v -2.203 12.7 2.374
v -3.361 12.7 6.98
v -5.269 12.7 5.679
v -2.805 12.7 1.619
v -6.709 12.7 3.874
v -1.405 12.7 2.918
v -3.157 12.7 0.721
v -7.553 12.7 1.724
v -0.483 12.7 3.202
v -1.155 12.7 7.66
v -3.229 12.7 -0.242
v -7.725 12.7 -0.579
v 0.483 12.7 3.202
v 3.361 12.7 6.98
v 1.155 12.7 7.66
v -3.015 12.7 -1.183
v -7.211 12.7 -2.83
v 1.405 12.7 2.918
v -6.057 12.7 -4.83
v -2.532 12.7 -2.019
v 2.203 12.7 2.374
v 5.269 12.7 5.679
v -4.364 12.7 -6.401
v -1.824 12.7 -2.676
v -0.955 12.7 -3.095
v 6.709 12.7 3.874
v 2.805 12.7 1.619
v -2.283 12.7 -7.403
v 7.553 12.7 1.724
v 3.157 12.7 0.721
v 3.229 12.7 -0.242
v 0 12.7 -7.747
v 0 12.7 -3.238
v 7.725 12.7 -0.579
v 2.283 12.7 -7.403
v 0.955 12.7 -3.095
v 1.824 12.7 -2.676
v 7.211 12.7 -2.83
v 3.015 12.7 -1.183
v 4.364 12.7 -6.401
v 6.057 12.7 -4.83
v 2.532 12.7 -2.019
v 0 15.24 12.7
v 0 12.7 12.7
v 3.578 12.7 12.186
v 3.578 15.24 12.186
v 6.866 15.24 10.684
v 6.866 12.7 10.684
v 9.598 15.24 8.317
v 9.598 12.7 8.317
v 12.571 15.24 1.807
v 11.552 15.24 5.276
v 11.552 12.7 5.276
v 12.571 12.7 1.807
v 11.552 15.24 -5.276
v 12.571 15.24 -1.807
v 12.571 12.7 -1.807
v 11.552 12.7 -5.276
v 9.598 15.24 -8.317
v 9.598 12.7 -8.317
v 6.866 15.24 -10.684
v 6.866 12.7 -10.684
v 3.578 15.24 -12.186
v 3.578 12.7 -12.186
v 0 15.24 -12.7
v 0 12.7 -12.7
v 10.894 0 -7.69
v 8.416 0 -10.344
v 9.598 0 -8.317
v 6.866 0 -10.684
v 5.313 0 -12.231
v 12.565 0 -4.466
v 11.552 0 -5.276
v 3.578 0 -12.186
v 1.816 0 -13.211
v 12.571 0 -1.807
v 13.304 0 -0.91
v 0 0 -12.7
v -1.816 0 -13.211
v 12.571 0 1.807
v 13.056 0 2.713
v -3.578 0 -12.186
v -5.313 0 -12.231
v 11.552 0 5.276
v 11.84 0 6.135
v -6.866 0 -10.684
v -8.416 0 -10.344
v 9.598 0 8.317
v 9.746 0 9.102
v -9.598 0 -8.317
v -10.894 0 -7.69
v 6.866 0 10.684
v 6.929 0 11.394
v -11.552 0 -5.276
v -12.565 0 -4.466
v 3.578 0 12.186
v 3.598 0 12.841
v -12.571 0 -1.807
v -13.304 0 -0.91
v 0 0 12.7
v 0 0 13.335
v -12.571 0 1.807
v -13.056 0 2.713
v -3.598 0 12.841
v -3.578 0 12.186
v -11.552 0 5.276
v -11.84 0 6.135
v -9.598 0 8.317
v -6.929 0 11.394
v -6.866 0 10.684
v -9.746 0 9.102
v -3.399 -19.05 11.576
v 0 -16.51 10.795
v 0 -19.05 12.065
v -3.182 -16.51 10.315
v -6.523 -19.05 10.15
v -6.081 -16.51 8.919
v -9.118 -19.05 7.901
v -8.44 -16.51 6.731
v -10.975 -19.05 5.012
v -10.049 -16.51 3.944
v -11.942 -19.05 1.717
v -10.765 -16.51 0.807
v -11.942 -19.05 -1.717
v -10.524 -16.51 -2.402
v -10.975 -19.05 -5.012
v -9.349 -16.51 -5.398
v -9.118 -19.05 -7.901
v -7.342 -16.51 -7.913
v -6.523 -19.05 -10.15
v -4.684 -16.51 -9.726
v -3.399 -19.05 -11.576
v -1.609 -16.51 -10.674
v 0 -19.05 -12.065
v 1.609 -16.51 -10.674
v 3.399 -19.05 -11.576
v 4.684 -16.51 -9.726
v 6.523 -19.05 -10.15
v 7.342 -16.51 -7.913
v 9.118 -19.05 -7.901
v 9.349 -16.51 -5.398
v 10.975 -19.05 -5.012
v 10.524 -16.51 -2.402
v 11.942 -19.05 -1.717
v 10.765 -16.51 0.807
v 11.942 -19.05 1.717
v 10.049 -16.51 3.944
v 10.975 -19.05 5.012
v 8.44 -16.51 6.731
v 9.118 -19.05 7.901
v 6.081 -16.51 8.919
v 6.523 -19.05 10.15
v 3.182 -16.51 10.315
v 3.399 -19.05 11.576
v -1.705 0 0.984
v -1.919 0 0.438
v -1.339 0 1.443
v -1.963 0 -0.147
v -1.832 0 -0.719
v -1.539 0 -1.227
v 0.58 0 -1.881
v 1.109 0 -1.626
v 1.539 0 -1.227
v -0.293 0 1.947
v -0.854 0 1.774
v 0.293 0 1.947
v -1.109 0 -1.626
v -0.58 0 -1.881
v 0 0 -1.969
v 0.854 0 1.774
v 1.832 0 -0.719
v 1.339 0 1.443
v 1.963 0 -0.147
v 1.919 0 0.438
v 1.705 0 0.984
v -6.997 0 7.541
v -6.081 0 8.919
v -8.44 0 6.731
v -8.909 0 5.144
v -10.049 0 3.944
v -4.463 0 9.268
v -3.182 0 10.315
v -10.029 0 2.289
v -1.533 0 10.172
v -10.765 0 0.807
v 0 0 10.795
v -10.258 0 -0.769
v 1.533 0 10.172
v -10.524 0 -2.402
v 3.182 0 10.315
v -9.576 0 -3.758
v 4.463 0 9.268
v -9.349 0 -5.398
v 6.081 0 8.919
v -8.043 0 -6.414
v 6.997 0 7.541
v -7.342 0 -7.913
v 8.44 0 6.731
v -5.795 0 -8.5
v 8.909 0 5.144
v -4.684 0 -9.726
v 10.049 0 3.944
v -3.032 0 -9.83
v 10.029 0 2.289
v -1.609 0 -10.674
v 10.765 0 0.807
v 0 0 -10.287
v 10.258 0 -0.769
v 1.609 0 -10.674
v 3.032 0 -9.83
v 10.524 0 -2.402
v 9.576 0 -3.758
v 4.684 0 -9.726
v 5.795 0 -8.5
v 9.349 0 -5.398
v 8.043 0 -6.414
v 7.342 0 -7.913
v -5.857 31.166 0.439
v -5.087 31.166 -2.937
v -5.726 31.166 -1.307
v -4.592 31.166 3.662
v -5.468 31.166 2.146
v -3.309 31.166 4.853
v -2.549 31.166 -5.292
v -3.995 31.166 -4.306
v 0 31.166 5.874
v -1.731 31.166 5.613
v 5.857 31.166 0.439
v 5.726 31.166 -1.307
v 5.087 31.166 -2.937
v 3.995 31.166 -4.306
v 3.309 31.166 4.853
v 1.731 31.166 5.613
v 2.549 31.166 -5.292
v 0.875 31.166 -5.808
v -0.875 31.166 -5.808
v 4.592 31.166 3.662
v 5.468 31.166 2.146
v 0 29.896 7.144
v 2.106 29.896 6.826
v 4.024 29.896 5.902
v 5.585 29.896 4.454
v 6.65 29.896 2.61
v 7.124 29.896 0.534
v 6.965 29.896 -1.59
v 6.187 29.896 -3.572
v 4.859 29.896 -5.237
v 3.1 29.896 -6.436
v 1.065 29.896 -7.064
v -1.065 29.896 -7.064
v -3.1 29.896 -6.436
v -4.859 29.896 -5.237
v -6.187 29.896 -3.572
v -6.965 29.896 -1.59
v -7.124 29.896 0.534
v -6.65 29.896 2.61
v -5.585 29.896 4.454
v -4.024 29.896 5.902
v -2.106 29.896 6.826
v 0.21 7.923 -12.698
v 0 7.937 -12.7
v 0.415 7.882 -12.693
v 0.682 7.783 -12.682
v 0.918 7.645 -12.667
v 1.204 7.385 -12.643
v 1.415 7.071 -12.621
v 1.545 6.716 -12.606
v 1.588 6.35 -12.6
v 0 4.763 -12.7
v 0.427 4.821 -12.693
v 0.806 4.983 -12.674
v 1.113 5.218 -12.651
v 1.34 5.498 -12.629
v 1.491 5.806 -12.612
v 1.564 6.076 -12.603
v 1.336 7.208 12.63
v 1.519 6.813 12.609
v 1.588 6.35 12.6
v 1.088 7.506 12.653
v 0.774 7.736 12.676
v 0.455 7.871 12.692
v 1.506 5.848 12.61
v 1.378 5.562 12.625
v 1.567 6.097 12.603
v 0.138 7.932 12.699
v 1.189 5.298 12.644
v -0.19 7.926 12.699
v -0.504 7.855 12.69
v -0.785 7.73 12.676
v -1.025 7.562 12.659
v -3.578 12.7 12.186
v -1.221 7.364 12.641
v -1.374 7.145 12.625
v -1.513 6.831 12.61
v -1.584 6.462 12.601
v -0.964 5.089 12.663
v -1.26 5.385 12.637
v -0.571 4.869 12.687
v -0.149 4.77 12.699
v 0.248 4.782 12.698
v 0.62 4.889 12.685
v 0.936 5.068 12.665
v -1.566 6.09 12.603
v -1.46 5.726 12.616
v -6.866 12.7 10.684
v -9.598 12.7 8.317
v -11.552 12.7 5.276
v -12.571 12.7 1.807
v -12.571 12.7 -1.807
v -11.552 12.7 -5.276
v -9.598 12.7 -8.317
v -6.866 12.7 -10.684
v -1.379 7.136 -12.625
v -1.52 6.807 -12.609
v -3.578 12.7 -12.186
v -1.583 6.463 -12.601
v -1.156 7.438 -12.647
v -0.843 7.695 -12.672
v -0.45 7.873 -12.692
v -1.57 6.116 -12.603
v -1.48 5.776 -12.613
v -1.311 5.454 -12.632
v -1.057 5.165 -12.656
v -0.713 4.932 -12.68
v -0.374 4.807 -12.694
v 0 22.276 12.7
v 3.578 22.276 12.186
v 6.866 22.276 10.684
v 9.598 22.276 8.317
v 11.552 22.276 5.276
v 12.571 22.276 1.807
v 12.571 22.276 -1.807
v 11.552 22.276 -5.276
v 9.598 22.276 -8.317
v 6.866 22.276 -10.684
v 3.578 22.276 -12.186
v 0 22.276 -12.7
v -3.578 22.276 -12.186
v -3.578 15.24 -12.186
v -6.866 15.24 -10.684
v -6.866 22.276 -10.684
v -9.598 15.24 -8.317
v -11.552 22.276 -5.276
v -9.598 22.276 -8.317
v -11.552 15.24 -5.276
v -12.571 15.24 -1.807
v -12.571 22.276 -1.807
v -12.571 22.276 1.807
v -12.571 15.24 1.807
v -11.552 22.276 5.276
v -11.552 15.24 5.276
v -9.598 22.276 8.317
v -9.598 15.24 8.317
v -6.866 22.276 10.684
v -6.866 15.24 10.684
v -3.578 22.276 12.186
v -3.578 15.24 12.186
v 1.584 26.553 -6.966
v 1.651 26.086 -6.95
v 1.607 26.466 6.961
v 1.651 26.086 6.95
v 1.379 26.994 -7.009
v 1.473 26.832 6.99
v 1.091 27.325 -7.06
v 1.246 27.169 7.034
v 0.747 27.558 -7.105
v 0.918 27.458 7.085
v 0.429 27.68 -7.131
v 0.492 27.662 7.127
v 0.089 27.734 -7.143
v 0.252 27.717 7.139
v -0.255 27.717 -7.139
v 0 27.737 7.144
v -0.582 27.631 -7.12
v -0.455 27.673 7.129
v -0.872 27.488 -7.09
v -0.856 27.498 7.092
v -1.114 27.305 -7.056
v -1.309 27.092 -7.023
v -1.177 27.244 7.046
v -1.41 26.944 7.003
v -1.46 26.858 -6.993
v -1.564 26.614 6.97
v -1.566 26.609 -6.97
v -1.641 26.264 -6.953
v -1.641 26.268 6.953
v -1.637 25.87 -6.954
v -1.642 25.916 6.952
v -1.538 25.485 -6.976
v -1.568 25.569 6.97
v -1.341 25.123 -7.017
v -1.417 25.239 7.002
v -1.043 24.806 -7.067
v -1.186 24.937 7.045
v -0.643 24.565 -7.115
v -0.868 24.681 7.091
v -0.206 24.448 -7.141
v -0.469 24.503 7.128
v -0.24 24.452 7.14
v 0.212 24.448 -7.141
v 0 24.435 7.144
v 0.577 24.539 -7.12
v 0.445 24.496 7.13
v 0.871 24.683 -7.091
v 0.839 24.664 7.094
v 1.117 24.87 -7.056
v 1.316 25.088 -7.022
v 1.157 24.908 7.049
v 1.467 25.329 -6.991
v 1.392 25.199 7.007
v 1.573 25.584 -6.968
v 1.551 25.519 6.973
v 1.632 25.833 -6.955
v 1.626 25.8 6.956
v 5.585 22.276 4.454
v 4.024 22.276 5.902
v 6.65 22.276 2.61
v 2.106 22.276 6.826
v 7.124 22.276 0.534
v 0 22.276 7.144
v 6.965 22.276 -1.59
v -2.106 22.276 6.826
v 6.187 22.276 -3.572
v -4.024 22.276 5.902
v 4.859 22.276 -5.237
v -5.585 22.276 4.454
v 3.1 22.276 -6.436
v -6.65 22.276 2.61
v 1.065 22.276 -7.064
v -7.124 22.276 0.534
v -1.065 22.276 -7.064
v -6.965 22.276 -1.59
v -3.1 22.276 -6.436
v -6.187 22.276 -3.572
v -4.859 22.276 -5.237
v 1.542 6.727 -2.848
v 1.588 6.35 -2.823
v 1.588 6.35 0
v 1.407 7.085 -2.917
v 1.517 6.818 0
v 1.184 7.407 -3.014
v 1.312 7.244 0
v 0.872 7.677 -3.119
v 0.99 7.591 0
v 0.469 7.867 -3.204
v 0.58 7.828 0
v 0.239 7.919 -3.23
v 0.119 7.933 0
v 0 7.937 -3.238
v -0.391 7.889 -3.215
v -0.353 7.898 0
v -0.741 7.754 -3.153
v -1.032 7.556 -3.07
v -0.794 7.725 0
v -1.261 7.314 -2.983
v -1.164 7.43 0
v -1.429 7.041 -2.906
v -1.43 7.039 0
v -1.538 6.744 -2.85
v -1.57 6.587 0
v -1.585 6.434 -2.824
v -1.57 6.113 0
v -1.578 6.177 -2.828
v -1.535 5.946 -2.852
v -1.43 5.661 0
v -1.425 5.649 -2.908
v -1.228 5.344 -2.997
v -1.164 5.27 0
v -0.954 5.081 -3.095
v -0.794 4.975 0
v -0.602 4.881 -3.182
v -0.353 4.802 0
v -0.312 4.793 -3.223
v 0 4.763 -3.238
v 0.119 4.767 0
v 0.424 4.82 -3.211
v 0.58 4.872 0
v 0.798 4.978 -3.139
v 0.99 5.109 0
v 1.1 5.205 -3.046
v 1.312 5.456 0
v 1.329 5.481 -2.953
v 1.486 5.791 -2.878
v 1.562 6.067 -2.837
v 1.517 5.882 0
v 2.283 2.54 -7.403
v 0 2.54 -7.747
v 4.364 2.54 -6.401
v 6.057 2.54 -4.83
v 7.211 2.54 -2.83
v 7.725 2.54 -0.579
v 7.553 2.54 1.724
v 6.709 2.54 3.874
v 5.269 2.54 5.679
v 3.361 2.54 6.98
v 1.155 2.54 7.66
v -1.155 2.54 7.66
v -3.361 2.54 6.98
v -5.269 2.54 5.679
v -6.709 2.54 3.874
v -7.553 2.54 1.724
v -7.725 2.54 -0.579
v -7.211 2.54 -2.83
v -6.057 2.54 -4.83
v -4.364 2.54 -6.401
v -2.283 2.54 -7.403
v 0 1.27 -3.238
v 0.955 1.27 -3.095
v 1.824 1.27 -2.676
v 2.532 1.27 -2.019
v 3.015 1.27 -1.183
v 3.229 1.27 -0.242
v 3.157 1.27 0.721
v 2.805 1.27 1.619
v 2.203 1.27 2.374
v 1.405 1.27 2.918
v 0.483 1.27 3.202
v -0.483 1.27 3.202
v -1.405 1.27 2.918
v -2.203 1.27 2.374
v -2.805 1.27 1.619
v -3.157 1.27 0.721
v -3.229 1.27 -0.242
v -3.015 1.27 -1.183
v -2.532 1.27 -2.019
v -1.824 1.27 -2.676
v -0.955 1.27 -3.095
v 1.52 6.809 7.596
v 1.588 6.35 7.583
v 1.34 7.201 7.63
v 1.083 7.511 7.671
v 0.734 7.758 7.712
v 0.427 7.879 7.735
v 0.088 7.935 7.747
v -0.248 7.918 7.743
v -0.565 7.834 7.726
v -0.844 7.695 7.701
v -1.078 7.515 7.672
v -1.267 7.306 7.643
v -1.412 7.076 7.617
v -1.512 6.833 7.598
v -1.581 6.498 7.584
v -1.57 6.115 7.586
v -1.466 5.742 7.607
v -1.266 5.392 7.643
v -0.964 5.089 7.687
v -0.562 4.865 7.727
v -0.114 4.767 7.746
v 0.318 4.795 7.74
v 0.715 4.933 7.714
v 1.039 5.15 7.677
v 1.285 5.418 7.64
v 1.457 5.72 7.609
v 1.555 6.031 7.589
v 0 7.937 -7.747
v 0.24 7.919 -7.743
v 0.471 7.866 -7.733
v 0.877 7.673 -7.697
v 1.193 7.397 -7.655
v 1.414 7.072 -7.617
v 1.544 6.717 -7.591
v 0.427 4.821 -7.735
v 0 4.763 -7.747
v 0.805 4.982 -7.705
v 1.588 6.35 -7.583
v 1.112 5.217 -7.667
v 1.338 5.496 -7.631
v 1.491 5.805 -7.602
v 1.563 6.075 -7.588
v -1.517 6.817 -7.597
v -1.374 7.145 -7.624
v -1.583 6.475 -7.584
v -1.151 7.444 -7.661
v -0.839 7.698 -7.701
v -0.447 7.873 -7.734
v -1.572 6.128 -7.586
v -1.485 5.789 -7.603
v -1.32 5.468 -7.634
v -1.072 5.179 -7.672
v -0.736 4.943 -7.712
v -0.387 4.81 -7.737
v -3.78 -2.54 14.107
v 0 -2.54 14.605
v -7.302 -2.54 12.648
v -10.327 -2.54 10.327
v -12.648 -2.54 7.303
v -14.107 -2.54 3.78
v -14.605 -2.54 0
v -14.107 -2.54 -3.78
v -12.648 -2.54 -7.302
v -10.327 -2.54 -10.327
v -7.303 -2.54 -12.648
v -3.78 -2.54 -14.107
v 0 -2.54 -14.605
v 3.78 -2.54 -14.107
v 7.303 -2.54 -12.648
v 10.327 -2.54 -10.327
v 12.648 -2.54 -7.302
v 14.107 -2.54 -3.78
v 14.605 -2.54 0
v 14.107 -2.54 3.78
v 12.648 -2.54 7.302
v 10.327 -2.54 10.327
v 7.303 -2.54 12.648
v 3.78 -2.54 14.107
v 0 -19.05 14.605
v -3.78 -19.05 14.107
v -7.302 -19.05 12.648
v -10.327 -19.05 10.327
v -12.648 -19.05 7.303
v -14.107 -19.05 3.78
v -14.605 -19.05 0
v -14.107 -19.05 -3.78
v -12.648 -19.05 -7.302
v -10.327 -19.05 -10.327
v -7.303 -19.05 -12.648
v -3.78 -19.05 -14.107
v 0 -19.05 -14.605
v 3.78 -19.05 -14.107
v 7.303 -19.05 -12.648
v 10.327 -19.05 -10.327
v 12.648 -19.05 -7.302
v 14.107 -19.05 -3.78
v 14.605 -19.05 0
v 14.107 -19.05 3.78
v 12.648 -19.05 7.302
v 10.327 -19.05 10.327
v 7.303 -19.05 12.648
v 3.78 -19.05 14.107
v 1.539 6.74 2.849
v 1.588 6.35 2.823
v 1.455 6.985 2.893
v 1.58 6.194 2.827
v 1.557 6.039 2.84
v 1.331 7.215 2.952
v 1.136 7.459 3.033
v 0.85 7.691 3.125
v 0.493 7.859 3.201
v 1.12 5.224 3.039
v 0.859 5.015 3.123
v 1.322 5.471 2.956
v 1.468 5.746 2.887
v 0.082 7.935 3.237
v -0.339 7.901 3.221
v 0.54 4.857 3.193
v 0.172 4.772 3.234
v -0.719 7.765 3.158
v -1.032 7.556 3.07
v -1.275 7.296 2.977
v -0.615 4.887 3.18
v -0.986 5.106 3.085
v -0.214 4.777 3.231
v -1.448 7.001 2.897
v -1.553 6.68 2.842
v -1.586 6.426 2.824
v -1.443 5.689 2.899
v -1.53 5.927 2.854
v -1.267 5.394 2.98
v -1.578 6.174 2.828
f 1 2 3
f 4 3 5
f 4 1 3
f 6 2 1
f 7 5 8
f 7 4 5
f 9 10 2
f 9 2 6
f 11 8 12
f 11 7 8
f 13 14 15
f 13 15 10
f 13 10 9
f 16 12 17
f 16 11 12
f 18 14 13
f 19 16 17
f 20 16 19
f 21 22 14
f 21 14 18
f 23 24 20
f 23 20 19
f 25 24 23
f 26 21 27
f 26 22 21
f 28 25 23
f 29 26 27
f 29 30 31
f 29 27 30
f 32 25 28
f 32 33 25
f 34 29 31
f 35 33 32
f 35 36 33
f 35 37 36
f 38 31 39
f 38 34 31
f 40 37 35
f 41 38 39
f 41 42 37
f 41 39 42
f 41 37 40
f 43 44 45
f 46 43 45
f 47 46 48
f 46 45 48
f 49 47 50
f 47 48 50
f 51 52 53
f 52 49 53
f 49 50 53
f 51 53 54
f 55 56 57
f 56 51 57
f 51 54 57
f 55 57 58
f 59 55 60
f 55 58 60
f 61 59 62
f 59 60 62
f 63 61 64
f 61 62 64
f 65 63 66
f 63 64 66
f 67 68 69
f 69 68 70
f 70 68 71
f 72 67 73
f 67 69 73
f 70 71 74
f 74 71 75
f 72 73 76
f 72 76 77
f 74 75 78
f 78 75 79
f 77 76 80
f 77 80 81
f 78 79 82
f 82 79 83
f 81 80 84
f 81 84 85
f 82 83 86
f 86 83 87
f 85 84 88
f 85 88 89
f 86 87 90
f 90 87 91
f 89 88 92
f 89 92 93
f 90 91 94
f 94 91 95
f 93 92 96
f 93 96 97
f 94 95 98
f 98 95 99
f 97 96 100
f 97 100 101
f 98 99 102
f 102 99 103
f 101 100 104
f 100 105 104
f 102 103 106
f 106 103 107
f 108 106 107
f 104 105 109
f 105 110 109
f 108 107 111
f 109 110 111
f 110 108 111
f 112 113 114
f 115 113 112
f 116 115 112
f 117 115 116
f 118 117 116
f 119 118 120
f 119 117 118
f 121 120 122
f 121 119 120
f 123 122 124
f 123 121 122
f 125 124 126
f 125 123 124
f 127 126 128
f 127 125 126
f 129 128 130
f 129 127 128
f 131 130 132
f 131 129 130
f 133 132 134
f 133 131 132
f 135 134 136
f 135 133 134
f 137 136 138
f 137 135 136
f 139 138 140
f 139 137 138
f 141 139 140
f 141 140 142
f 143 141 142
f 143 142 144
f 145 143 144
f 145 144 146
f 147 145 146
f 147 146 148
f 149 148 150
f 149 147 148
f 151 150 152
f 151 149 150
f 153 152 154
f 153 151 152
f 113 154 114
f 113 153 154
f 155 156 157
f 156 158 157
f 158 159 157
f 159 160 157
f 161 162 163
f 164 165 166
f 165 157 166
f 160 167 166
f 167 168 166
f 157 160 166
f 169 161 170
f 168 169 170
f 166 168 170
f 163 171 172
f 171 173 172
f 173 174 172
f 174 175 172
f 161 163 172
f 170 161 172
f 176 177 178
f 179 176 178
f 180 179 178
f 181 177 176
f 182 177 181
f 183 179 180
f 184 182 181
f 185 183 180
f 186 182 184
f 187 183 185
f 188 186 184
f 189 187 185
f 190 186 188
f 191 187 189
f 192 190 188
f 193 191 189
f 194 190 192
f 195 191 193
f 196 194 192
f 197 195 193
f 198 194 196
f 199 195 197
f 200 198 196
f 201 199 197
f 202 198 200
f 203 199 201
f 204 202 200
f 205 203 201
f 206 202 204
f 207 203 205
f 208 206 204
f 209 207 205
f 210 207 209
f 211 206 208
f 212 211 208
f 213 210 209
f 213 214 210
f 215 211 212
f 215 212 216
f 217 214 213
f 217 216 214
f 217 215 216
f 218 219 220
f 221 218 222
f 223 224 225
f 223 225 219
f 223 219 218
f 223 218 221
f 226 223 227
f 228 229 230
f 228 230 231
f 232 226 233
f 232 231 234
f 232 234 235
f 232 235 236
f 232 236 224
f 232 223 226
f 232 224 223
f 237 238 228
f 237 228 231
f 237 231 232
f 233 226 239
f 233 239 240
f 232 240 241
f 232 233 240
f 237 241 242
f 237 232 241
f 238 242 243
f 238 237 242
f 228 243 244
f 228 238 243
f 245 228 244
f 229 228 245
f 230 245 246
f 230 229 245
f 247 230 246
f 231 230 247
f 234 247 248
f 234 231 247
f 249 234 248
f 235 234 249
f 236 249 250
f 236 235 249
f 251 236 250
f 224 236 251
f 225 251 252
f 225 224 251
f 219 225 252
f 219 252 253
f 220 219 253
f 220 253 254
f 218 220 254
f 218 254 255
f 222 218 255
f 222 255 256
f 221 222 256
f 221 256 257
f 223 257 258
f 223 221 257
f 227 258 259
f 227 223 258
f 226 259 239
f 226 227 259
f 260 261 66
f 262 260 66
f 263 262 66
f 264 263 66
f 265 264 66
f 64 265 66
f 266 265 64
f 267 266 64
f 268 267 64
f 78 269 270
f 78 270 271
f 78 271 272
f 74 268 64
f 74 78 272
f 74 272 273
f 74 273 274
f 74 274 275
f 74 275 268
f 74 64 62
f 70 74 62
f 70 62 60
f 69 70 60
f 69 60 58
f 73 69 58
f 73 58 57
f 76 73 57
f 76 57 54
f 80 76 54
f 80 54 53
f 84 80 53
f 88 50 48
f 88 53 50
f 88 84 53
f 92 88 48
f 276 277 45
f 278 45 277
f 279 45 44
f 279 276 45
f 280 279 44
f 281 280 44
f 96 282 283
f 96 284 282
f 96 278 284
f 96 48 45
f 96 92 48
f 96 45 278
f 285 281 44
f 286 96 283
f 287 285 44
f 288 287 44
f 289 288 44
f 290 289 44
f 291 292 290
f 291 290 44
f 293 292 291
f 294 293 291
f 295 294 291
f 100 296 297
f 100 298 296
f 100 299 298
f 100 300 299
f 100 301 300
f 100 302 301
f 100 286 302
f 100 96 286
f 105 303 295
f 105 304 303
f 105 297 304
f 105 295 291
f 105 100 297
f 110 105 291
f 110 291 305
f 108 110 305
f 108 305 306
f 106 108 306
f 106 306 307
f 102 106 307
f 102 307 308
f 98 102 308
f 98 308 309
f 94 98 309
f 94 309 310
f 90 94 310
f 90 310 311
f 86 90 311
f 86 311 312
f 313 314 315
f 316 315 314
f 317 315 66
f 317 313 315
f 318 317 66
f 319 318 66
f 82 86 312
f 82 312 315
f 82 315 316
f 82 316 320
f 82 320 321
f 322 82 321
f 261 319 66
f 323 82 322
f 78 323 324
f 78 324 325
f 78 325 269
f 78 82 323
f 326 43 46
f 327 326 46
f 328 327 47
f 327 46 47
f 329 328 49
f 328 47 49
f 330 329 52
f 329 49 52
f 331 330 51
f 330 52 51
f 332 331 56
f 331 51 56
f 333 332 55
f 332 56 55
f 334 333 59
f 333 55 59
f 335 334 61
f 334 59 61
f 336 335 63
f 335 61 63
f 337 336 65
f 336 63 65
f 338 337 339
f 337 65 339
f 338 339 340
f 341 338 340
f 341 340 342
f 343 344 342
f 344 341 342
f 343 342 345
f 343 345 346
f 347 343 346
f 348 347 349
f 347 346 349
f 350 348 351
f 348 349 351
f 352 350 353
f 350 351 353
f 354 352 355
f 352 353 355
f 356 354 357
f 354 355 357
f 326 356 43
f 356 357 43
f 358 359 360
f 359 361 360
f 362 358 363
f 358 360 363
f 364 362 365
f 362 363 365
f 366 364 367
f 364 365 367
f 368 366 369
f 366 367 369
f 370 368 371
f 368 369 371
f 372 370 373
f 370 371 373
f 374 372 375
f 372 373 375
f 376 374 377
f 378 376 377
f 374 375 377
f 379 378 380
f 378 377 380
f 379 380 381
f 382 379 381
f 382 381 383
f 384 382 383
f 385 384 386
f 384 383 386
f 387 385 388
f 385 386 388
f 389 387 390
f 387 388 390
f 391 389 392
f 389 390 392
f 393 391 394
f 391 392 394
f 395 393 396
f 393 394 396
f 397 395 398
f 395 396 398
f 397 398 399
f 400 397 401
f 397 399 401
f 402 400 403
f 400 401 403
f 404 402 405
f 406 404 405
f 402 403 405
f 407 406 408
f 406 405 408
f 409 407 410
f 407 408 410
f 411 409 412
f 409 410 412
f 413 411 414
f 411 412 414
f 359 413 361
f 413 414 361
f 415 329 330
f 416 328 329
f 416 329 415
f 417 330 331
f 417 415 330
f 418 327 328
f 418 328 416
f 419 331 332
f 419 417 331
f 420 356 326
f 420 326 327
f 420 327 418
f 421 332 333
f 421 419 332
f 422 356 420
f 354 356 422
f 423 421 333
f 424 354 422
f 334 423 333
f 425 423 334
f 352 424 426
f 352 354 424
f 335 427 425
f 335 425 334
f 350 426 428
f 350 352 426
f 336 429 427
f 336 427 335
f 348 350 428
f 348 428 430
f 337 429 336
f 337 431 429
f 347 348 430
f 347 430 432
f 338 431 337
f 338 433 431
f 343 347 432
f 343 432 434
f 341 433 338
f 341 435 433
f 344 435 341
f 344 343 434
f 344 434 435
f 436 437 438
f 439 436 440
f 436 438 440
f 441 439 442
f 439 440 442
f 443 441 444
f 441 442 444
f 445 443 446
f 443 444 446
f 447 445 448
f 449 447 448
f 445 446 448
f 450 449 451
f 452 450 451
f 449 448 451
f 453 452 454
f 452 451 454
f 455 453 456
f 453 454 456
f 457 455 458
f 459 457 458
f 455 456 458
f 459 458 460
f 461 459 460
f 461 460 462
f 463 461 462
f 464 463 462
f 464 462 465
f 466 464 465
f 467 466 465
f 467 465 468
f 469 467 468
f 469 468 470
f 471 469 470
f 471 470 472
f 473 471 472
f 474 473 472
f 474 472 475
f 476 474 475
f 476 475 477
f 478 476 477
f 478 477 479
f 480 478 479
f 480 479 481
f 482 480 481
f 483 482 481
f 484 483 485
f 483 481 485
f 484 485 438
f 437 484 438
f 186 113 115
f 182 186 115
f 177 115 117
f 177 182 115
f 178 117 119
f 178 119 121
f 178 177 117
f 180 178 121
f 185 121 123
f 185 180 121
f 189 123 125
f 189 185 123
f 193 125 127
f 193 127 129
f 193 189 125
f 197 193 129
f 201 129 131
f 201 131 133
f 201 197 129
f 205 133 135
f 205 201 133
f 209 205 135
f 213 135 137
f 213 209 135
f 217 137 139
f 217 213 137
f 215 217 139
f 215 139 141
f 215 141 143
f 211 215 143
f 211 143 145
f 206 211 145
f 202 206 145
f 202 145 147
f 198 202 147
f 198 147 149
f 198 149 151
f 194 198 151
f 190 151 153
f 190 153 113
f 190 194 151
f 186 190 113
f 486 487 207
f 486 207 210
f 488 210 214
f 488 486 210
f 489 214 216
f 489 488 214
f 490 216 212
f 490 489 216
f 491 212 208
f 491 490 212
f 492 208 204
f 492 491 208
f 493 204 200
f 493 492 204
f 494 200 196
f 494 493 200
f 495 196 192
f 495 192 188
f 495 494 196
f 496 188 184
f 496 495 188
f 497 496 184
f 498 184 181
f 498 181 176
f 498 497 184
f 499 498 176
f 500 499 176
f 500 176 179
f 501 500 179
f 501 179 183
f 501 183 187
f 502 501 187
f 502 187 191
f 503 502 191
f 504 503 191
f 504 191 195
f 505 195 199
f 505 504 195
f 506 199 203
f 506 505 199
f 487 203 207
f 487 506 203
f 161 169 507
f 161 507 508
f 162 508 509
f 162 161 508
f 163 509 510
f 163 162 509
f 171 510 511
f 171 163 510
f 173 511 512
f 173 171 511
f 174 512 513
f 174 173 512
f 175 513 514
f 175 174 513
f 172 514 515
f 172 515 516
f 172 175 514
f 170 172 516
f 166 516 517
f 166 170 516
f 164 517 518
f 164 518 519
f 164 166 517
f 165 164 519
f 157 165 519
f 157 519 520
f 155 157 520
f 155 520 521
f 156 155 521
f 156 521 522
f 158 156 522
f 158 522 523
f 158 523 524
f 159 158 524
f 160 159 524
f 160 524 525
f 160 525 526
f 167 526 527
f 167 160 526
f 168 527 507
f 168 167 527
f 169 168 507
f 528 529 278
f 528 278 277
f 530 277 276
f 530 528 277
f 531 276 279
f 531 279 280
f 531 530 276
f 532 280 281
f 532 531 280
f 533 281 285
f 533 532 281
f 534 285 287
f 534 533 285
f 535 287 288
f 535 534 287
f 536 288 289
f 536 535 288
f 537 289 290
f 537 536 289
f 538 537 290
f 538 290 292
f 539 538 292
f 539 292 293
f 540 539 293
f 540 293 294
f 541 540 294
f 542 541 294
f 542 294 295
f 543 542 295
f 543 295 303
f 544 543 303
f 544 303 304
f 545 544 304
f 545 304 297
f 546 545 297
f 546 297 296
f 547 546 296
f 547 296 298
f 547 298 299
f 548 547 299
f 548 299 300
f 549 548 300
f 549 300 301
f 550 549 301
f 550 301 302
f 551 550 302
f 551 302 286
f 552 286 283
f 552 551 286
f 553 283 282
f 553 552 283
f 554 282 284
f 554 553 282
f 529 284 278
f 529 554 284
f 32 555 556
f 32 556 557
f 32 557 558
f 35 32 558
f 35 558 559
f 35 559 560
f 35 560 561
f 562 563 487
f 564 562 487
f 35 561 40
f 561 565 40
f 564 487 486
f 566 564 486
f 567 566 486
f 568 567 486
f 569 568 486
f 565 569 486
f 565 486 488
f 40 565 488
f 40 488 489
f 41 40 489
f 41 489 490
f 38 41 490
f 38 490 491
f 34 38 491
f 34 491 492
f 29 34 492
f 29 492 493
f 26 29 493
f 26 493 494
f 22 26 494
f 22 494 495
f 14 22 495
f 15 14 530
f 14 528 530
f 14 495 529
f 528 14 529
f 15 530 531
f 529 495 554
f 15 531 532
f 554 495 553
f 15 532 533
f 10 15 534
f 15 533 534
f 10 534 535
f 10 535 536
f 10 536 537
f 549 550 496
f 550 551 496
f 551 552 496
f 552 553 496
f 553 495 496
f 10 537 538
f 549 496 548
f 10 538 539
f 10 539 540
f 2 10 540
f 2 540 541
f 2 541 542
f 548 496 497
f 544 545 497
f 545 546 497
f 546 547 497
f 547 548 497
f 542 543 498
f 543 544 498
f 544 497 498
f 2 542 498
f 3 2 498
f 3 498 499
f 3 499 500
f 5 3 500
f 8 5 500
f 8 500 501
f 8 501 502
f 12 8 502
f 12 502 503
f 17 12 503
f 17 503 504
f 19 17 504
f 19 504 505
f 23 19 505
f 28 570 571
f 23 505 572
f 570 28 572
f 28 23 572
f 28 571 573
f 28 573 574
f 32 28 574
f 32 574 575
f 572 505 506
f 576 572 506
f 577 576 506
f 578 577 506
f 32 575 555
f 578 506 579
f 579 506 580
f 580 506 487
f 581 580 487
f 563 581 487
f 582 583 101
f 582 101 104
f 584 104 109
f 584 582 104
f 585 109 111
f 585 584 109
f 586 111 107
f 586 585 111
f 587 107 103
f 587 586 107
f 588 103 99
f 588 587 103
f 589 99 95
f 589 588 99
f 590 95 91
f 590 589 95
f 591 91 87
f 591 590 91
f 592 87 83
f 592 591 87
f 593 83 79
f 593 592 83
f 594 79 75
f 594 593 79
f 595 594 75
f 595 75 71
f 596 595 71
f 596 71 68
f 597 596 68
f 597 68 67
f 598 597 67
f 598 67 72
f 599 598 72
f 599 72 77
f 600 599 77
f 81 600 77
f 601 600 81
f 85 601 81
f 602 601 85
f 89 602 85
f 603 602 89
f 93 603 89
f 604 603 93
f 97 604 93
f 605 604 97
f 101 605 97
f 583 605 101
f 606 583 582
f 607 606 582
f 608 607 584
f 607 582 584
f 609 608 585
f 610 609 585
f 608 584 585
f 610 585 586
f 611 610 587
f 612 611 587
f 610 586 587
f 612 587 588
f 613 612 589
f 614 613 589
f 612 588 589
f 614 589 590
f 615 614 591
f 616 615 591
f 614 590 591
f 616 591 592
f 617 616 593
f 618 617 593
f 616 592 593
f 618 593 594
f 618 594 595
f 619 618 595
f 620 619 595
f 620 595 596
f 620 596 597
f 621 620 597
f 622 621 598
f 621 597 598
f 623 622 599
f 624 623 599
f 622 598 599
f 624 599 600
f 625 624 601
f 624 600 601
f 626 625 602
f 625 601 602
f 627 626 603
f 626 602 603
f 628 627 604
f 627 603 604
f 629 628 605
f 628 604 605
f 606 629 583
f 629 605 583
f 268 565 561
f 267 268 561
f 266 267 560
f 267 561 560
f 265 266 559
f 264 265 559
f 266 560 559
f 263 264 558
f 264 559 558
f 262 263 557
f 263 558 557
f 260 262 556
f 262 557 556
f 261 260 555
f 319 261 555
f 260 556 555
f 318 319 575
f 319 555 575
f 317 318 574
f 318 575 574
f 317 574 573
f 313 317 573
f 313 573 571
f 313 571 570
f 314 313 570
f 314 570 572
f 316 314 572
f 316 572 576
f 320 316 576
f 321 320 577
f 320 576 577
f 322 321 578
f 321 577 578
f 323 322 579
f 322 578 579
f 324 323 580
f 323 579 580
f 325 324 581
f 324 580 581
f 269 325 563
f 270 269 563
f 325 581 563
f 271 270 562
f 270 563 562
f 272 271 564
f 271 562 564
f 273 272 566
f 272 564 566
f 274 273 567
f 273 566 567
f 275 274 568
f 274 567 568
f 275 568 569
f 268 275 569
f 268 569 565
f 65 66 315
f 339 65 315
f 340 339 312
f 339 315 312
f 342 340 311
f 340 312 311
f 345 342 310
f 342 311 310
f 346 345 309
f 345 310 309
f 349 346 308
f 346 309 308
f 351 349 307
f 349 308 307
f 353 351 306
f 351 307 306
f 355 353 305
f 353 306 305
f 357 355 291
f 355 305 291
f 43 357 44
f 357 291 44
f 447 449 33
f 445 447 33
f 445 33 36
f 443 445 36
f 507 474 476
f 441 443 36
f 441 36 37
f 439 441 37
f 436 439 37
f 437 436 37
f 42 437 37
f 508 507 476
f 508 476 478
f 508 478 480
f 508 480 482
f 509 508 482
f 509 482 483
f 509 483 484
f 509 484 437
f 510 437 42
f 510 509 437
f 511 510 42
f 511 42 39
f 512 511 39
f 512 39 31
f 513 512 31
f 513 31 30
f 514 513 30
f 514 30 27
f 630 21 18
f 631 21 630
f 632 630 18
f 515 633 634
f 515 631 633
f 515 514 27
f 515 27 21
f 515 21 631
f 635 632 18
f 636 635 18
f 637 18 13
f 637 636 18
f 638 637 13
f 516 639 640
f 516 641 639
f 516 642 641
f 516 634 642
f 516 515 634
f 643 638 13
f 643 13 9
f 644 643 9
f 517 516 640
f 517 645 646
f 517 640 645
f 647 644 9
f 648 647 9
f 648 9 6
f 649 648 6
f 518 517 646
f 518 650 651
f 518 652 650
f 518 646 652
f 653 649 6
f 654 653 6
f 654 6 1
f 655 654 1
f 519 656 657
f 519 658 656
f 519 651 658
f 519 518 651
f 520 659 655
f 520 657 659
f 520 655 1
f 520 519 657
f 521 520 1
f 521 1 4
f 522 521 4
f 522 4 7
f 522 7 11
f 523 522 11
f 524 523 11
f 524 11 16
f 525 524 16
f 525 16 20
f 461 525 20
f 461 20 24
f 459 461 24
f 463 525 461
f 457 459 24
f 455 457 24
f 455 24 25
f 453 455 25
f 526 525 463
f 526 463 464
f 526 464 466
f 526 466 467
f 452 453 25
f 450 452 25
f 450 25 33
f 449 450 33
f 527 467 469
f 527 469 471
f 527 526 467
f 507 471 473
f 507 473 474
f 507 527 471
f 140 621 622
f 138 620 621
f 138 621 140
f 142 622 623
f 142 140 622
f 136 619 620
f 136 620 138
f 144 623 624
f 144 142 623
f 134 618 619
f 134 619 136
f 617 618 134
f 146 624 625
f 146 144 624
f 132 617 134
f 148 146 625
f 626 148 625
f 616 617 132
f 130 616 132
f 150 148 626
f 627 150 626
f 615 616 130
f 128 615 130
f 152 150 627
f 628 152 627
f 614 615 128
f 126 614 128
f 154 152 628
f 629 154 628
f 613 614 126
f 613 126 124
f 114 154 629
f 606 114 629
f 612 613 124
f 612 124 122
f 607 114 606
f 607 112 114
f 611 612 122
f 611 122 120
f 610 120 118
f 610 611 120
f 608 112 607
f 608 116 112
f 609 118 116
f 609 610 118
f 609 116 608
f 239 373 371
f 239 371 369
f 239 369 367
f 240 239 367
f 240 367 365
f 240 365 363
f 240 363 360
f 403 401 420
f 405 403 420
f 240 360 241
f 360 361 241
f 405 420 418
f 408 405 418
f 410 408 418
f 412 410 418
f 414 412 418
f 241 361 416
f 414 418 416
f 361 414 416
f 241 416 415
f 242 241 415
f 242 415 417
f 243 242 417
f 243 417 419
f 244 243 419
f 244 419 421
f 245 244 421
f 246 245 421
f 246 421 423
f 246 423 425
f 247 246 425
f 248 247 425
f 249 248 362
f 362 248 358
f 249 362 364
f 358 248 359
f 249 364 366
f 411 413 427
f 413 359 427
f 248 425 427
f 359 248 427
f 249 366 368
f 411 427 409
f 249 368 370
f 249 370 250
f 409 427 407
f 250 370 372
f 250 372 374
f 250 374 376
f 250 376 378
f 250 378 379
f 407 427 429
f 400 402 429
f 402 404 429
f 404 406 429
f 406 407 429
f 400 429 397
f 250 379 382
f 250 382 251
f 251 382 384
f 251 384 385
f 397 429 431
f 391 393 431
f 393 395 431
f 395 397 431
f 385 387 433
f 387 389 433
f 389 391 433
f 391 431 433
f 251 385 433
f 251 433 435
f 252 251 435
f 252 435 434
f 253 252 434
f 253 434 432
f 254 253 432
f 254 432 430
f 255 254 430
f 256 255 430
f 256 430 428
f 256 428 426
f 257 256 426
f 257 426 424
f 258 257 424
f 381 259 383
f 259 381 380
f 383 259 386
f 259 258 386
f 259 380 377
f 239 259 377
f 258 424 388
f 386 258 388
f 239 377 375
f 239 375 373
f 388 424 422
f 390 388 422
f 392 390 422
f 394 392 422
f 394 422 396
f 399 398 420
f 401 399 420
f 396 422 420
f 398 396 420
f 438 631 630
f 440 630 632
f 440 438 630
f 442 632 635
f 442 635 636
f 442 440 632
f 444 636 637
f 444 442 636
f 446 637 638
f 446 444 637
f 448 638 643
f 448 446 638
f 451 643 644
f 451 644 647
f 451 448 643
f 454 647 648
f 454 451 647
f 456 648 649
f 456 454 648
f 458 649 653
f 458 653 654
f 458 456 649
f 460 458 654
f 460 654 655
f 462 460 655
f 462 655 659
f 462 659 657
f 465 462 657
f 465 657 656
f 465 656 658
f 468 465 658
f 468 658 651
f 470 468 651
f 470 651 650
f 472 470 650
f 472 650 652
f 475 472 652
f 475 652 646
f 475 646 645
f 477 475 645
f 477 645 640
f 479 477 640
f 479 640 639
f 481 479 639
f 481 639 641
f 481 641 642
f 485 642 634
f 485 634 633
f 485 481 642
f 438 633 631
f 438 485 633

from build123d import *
from OCP.BRepFilletAPI import BRepFilletAPI_MakeChamfer

# Parameters (mm, degrees)
SKETCH1_R           = 12.7
BOSS_EXTRUDE1_DEPTH = 31.1658
SKETCH2_R           = 12.7
SKETCH2_R_2         = 3.2385
CUT_EXTRUDE1_DEPTH  = 12.7
CUT_EXTRUDE2_START  = -8.89
SKETCH3_R           = 12.7
SKETCH3_R_2         = 7.14375
CUT_EXTRUDE2_DEPTH  = 8.89
CHAMFER1_SIZE       = 1.27
SKETCH4_R           = 12.7
SKETCH4_R_2         = 7.747
BOSS_EXTRUDE2_DEPTH = 15.24
CHAMFER2_SIZE       = 2.54
SKETCH6_R           = 1.5875
SKETCH6_R_2         = 1.651
CUT_EXTRUDE3_DEPTH  = 50.8
SKETCH7_R           = 14.605
SKETCH7_R_2         = 10.795
BOSS_EXTRUDE3_DEPTH = 19.05
CHAMFER3_SIZE       = 1.27
CHAMFER3_SIZE2      = 2.54


with BuildPart() as part:
    # Sketch1 → Boss-Extrude1 (new body)
    with BuildSketch(Plane(origin=(0, 0, 0), x_dir=(1, 0, 0), z_dir=(0, 1, 0))):
        with Locations(Location((0, 0, 0), (0, 0, 270))):
            Circle(SKETCH1_R)
    extrude(amount=BOSS_EXTRUDE1_DEPTH)

    # Sketch2 → Cut-Extrude1 (cut)
    with BuildSketch(Plane.XZ):
        with Locations(Location((0, 0, 0), (0, 0, 270))):
            Circle(SKETCH2_R)
        with Locations(Location((0, 0, 0), (0, 0, 270))):
            Circle(SKETCH2_R_2, mode=Mode.SUBTRACT)
    extrude(amount=-CUT_EXTRUDE1_DEPTH, mode=Mode.SUBTRACT)

    # Sketch3 → Cut-Extrude2 (cut)
    with BuildSketch(Plane(origin=(0, 31.1658, 0), x_dir=(1, 0, 0), z_dir=(0, 1, 0)).offset(CUT_EXTRUDE2_START)):
        with Locations(Location((0, 0, 0), (0, 0, 90))):
            Circle(SKETCH3_R)
        with Locations(Location((0, 0, 0), (0, 0, 270))):
            Circle(SKETCH3_R_2, mode=Mode.SUBTRACT)
    extrude(amount=CUT_EXTRUDE2_DEPTH, mode=Mode.SUBTRACT)

    # Chamfer1
    chamfer1_edges = [part.edges().sort_by_distance(p)[0] for p in [
        (0, 31.1658, -7.14375),
        (0, 0, 3.2385),
    ]]
    chamfer(chamfer1_edges, length=CHAMFER1_SIZE)

    # Sketch4 → Boss-Extrude2 (add)
    with BuildSketch(Plane.XZ):
        with Locations(Location((0, 0, 0), (0, 0, 270))):
            Circle(SKETCH4_R)
        with Locations(Location((0, 0, 0), (0, 0, 270))):
            Circle(SKETCH4_R_2, mode=Mode.SUBTRACT)
    extrude(amount=-BOSS_EXTRUDE2_DEPTH)

    # Chamfer2
    chamfer2_edges = [part.edges().sort_by_distance(p)[0] for p in [
        (0, 0, 7.747),
    ]]
    chamfer(chamfer2_edges, length=CHAMFER2_SIZE)

    # Sketch6 → Cut-Extrude3 (cut, symmetric)
    with BuildSketch(Plane.XY):
        with Locations((0, 6.35)):
            Circle(SKETCH6_R)
        with Locations((0, 26.0858)):
            Circle(SKETCH6_R_2)
    extrude(amount=CUT_EXTRUDE3_DEPTH, both=True, mode=Mode.SUBTRACT)

    # Sketch7 → Boss-Extrude3 (add)
    with BuildSketch(Plane.XZ):
        with Locations(Location((0, 0, 0), (0, 0, 90))):
            Circle(SKETCH7_R)
        with Locations(Location((0, 0, 0), (0, 0, 90))):
            Circle(SKETCH7_R_2, mode=Mode.SUBTRACT)
    extrude(amount=BOSS_EXTRUDE3_DEPTH)

    # Chamfer3: one chamfer whose edges measure the first distance from different faces: ONE call of the kernel's chamfer builder (chamfer() names one face for all edges)
    chamfer3_edges_1 = [part.edges().sort_by_distance(p)[0] for p in [
        (0, 0, -14.605),
    ]]
    chamfer3_side_1 = [part.faces().sort_by_distance(p)[0] for p in [
        (0, 0, -14.191908218),
    ]]
    chamfer3_edges_2 = [part.edges().sort_by_distance(p)[0] for p in [
        (0, -19.05, -10.795),
    ]]
    chamfer3_side_2 = [part.faces().sort_by_distance(p)[0] for p in [
        (0, -19.05, -14.191908218),
    ]]
    chamfer3 = BRepFilletAPI_MakeChamfer(part.part.solid().wrapped)
    for e in chamfer3_edges_1:
        chamfer3.Add(CHAMFER3_SIZE, CHAMFER3_SIZE2, e.wrapped, chamfer3_side_1[0].wrapped)  # the first distance lies on this face
    for e in chamfer3_edges_2:
        chamfer3.Add(CHAMFER3_SIZE, CHAMFER3_SIZE2, e.wrapped, chamfer3_side_2[0].wrapped)  # the first distance lies on this face
    add(Compound.cast(chamfer3.Shape()), mode=Mode.REPLACE)


solid = part.part
